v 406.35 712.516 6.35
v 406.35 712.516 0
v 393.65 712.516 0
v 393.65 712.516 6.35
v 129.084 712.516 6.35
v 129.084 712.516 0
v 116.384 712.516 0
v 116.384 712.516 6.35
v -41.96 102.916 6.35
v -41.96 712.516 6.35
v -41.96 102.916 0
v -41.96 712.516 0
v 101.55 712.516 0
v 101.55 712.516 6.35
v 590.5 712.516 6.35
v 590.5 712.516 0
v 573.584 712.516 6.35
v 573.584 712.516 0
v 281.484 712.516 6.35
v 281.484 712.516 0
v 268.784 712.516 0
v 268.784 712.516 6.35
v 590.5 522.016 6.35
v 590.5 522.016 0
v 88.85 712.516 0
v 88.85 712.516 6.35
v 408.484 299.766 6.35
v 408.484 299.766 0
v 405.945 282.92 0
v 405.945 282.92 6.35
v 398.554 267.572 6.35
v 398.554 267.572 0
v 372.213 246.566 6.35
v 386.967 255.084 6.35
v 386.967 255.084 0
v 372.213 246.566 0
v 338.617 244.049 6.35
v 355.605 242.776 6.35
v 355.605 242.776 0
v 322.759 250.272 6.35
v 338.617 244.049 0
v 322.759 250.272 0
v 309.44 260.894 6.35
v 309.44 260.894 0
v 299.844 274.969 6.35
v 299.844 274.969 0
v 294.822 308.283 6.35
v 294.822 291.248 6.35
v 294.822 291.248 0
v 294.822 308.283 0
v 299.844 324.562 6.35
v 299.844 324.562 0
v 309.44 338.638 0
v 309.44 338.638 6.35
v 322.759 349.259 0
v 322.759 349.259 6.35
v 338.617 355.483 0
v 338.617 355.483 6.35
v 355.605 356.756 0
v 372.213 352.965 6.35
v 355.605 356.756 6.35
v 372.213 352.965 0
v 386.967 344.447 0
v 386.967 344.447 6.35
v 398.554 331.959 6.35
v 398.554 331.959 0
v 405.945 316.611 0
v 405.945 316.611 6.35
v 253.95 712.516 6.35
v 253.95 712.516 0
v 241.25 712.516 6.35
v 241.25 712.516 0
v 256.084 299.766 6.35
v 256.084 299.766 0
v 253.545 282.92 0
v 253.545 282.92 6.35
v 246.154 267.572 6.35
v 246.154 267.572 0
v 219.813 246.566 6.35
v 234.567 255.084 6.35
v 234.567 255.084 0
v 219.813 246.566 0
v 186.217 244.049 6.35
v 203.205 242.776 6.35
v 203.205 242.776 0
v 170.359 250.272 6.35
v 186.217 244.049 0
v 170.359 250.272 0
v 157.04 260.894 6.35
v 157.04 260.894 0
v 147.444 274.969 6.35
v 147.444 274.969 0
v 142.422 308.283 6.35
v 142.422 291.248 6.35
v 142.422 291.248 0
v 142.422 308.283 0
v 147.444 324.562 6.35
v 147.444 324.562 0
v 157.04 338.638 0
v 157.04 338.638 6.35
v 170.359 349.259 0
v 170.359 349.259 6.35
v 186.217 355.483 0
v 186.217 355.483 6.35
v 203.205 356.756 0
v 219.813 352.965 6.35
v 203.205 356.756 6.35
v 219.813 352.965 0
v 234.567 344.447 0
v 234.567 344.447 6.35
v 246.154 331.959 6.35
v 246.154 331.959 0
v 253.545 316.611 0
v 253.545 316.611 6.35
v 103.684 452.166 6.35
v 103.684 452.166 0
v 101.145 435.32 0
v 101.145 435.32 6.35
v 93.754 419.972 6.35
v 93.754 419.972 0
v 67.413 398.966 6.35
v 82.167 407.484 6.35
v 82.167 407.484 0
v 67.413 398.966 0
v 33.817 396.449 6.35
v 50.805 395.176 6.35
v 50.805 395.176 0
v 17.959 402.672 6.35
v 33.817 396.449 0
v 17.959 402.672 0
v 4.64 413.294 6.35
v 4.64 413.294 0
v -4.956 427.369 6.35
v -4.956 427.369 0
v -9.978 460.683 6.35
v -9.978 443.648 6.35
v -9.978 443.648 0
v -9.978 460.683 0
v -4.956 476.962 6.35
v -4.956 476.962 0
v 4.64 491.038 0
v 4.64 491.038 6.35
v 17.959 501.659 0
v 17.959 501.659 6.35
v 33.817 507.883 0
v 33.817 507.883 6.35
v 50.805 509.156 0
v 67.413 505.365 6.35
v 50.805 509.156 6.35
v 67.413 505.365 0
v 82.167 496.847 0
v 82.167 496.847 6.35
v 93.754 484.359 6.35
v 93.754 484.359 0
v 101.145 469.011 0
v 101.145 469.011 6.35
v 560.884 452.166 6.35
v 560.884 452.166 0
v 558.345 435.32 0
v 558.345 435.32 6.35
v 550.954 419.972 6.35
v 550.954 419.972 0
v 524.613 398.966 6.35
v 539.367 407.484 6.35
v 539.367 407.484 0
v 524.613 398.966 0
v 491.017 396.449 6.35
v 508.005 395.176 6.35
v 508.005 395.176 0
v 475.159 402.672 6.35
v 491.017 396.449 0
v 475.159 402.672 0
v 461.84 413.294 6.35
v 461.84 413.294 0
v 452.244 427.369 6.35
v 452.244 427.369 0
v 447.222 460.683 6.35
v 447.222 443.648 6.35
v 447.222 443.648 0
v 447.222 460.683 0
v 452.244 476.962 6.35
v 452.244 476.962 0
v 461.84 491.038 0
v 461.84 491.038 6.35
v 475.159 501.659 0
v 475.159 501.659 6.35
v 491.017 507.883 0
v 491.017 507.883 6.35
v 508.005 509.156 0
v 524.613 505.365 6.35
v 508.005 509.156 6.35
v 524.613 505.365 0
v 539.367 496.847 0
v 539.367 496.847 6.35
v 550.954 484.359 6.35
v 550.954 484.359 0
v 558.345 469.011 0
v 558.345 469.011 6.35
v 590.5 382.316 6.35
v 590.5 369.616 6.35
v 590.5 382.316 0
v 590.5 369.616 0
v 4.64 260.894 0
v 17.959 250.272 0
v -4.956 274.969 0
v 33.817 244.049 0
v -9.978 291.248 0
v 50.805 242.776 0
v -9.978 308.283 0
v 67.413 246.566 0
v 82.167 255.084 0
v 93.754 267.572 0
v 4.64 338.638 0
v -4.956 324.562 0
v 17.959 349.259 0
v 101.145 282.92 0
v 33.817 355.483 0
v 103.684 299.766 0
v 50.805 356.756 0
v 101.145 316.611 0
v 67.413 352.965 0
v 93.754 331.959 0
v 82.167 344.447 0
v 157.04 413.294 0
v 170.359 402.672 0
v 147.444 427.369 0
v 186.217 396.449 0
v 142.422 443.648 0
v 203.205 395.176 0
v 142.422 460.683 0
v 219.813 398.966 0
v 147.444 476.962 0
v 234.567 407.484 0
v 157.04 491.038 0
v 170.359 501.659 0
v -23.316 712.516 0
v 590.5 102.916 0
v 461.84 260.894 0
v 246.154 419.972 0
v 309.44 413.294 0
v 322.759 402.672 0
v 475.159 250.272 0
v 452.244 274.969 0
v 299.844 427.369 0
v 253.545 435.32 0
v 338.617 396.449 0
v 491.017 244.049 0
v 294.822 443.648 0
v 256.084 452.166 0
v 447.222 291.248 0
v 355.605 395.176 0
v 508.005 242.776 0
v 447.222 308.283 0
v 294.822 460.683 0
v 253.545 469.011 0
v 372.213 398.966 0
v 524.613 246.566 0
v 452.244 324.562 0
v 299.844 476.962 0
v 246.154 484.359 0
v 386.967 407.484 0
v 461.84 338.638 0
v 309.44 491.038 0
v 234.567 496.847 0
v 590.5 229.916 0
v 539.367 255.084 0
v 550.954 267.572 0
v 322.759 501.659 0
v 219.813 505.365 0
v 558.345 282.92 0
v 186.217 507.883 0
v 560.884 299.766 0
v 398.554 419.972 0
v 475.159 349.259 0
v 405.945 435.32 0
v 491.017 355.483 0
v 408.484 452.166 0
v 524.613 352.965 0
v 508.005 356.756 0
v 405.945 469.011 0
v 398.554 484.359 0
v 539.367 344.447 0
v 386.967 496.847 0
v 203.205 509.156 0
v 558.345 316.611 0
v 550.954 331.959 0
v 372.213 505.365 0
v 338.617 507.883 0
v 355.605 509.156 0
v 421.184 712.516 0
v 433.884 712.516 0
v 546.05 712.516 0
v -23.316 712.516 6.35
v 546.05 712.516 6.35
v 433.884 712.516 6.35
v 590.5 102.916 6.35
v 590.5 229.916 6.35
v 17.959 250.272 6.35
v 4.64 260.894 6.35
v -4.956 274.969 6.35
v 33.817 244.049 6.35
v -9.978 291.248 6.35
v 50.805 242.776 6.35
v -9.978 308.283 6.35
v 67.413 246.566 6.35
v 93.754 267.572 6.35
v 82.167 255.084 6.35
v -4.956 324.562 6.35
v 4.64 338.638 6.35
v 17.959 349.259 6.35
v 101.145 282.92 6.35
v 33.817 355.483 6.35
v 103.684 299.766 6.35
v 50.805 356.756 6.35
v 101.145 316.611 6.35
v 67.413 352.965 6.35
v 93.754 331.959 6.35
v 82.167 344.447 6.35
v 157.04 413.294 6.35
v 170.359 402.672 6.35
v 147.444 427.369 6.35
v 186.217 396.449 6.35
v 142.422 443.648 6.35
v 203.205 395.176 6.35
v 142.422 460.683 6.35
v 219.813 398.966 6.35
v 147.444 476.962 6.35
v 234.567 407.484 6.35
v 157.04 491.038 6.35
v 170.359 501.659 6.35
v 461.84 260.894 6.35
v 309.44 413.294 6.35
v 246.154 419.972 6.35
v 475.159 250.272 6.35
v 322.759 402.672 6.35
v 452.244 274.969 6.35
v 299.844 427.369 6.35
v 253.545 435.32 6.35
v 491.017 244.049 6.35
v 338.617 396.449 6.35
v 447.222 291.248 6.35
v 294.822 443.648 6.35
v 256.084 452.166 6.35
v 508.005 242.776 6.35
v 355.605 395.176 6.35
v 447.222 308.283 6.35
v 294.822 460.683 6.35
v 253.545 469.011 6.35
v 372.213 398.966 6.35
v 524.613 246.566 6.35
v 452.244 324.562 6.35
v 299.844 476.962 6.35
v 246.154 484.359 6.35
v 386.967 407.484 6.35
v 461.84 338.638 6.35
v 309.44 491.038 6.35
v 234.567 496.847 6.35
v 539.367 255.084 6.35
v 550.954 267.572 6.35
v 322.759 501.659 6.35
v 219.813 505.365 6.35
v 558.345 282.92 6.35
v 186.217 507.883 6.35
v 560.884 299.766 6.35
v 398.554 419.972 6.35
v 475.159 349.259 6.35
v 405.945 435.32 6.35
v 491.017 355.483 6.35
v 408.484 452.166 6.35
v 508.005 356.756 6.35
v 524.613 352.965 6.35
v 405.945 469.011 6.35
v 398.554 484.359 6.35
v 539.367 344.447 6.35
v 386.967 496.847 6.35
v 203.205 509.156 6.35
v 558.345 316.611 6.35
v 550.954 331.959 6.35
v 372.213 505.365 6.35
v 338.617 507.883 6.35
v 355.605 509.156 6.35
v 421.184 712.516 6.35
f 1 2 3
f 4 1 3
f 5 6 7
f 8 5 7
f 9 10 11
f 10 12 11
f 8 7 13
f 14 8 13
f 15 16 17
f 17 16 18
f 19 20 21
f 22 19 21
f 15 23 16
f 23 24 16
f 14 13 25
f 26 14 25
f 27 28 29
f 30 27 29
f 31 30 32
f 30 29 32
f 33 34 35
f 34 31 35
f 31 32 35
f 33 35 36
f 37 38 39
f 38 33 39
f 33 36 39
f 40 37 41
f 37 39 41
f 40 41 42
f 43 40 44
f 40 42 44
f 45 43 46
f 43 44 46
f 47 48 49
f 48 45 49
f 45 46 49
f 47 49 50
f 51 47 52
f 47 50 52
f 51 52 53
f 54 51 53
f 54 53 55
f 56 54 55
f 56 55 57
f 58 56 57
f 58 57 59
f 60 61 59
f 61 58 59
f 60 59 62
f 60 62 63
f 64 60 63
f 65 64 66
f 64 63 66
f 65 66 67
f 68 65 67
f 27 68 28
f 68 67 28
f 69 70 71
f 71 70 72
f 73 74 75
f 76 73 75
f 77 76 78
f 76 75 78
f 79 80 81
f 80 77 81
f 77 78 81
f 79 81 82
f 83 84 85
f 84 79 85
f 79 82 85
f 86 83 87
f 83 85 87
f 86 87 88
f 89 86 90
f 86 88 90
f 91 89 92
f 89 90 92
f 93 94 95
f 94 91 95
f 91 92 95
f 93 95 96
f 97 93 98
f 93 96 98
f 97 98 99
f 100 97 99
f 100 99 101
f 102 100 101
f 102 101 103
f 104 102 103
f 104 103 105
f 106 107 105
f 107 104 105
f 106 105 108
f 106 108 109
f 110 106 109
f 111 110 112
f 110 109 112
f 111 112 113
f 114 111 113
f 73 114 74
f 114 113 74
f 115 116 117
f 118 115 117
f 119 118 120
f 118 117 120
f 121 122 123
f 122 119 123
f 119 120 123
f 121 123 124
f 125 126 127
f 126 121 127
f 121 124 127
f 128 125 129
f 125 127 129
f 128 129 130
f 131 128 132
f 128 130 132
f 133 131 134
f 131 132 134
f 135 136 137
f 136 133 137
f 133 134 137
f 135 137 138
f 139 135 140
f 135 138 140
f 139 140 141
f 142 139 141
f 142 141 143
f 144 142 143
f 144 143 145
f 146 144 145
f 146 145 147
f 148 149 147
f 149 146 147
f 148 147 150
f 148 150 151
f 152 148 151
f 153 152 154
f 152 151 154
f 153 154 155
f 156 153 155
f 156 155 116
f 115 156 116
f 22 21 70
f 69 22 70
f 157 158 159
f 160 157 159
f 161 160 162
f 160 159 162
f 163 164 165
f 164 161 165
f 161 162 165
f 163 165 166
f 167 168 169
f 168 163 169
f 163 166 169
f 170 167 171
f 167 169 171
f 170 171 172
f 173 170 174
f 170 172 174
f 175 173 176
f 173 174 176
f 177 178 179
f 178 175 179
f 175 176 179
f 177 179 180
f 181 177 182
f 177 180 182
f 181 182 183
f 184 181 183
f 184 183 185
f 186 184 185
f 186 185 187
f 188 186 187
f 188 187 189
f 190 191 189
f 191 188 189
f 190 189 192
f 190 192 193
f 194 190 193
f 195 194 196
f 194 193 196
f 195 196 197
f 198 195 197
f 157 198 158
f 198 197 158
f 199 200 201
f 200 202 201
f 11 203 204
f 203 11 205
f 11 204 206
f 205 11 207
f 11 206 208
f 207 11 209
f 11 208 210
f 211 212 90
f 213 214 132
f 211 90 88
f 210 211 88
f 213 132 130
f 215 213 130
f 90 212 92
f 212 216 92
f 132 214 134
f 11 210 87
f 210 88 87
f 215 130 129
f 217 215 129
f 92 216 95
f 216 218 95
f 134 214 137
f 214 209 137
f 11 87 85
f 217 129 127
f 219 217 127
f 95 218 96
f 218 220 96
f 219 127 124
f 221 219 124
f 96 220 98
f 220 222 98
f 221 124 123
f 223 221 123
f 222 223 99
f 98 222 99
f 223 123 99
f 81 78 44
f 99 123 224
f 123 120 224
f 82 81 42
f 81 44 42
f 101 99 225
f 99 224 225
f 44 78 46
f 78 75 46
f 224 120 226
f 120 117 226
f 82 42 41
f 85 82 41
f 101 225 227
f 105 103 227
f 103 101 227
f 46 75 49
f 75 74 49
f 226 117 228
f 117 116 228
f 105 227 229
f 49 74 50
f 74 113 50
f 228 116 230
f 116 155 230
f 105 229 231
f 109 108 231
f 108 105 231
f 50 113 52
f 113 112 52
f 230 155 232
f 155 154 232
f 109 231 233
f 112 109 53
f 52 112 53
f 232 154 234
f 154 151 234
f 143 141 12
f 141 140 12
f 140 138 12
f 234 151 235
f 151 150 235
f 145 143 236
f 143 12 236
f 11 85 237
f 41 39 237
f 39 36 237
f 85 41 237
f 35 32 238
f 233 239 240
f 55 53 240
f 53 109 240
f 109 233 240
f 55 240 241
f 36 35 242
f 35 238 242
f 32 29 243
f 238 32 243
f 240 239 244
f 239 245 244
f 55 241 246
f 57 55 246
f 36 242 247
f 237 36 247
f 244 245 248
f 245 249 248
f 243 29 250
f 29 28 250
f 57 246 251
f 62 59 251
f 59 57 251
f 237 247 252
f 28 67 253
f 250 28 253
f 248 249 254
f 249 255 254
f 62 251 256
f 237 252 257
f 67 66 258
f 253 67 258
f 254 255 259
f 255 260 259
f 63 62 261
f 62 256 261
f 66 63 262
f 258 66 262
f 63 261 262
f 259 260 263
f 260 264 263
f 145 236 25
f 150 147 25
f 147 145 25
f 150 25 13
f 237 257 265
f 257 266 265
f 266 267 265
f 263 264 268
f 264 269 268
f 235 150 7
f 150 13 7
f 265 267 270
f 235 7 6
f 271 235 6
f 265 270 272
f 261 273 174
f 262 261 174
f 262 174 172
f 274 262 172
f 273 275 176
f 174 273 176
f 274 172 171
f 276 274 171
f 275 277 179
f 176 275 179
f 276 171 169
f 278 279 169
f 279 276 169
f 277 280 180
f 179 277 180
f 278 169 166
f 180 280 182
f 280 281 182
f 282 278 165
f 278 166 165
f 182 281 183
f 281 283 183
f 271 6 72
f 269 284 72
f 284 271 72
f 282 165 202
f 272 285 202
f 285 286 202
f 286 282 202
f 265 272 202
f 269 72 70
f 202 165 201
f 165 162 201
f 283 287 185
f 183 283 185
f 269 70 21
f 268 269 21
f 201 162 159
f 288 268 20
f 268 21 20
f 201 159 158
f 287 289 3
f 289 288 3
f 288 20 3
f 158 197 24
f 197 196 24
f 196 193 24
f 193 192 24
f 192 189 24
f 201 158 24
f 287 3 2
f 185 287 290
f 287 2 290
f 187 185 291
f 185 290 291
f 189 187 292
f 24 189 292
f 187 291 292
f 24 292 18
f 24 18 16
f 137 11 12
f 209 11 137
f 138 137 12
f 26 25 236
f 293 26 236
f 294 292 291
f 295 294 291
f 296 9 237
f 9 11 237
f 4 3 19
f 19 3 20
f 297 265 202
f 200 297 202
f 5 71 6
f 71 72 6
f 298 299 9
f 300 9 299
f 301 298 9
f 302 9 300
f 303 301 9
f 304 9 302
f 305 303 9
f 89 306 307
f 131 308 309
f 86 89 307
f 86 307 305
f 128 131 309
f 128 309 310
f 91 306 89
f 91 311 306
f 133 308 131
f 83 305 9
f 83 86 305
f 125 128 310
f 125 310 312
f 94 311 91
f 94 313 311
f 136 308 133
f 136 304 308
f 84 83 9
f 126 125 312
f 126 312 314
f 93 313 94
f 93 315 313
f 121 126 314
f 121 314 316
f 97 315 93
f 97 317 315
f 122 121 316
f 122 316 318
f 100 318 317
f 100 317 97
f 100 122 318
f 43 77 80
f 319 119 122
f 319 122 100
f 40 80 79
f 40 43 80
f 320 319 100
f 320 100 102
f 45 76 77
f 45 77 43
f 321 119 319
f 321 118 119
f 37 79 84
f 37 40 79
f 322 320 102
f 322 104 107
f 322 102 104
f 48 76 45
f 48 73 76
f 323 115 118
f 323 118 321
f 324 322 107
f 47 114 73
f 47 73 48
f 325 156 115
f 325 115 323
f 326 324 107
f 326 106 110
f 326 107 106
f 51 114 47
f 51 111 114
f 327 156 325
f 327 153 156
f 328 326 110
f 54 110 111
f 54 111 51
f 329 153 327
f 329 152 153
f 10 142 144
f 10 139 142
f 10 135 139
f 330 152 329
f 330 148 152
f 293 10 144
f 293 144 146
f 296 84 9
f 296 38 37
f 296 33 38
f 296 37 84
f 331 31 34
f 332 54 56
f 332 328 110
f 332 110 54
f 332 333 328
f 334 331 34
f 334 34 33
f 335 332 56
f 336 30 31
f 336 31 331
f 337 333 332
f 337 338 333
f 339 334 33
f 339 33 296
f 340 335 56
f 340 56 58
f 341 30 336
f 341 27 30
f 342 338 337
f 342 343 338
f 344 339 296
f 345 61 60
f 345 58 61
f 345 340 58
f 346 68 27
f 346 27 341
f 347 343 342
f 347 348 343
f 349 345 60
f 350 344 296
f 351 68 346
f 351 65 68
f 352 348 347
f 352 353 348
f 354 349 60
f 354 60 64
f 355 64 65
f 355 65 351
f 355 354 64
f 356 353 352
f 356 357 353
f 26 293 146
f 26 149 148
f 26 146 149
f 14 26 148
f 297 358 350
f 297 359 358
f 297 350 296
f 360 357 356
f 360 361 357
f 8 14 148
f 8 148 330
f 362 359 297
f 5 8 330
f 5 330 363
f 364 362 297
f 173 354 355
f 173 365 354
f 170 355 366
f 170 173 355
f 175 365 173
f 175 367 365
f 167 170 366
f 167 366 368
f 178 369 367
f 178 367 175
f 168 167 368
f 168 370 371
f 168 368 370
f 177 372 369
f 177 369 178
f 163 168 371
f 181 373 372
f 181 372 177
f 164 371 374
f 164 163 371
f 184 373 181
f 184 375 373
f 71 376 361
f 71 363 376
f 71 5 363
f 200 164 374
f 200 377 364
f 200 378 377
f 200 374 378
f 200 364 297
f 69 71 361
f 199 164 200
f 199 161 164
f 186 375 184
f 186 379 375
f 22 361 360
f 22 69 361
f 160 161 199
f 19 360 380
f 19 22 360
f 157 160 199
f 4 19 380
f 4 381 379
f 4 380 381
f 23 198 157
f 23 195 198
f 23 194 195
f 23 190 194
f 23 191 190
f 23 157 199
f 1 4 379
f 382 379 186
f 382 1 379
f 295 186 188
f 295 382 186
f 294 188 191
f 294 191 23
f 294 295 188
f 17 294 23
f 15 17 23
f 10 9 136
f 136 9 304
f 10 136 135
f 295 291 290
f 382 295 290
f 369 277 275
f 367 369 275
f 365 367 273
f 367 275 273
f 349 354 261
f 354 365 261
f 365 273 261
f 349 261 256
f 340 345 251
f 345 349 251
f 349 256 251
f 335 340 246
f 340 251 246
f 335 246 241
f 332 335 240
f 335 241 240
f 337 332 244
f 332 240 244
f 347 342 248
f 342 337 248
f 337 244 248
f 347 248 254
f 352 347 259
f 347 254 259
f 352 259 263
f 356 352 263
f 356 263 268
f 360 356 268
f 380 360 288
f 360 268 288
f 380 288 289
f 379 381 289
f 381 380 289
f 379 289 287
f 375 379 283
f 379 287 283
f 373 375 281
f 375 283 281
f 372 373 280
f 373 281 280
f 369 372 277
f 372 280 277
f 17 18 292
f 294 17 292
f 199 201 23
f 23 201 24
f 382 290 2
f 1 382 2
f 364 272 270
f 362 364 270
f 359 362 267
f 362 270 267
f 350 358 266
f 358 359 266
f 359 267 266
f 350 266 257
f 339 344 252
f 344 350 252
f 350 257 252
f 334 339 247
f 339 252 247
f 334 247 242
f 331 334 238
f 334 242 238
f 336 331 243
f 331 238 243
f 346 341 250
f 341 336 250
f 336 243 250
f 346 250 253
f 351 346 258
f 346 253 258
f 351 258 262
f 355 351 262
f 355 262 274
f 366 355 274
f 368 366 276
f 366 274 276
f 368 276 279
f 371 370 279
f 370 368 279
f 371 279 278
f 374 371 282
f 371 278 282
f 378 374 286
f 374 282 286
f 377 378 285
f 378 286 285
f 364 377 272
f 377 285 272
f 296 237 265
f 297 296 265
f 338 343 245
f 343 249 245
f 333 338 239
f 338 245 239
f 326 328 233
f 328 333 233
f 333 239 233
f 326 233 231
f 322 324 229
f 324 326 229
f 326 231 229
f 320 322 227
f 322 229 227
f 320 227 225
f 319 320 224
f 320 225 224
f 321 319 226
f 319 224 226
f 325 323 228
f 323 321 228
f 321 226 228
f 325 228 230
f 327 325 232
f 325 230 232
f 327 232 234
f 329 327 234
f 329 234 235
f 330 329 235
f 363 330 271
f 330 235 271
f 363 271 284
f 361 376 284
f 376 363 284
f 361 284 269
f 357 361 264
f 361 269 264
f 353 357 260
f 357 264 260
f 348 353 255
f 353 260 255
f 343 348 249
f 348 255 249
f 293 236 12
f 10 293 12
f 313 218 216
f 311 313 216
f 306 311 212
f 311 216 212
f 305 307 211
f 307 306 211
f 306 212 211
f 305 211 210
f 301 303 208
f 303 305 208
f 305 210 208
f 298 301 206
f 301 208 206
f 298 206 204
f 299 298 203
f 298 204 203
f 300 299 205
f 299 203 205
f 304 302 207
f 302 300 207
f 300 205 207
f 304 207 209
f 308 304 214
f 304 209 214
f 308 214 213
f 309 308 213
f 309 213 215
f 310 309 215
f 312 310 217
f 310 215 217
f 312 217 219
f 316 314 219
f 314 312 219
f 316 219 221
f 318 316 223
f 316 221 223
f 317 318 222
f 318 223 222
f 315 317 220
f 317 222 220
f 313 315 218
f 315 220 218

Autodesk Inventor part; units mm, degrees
ref_plane "YZ Plane" through (0, 0, 0) normal (1, 0, 0) x (0, 1, 0)
ref_plane "XZ Plane" through (0, 0, 0) normal (0, 1, 0) x (-1, 0, 0)
ref_plane "XY Plane" through (0, 0, 0) normal (0, 0, 1) x (1, 0, 0)
sketch "Sketch1" plane through (0, 0, 0) normal (0, 0, 1) x (1, 0, 0)
  line L0 (-41.9595, 102.9157) -> (590.5005, 102.9157)
  line L1 (590.5005, 102.9157) -> (590.5005, 712.5157)
  line L2 (590.5005, 712.5157) -> (-41.9595, 712.5157)
  line L3 (-41.9595, 712.5157) -> (-41.9595, 102.9157)
  line L4 (-41.9595, 712.5157) -> (-23.3159, 712.5157)
  line L5 (590.5005, 712.5157) -> (546.0505, 712.5157)
  line L6 (546.0505, 712.5157) -> (406.3505, 712.5157)
  line L7 (406.3505, 712.5157) -> (393.6505, 712.5157)
  line L8 (393.6505, 712.5157) -> (253.9505, 712.5157)
  line L9 (253.9505, 712.5157) -> (241.2505, 712.5157)
  line L10 (241.2505, 712.5157) -> (101.5505, 712.5157)
  line L11 (101.5505, 712.5157) -> (88.8505, 712.5157)
  line L12 (88.8505, 712.5157) -> (-23.3159, 712.5157)
  line L13 (590.5005, 102.9157) -> (590.5005, 229.9157)
  line L14 (590.5005, 229.9157) -> (590.5005, 369.6157)
  line L15 (590.5005, 369.6157) -> (590.5005, 382.3157)
  line L16 (590.5005, 382.3157) -> (590.5005, 522.0157)
  circle A0 centre (46.5341, 452.1657) radius 57.15
  circle A1 centre (198.9341, 452.1657) radius 57.15
  circle A2 centre (351.3341, 452.1657) radius 57.15
  circle A3 centre (503.7341, 452.1657) radius 57.15
  circle A4 centre (46.5341, 299.7657) radius 57.15
  circle A5 centre (198.9341, 299.7657) radius 57.15
  circle A6 centre (351.3341, 299.7657) radius 57.15
  circle A7 centre (503.7341, 299.7657) radius 57.15
  line L17 (-23.3159, 712.5157) -> (116.3841, 712.5157)
  line L18 (116.3841, 712.5157) -> (129.0841, 712.5157)
  line L19 (129.0841, 712.5157) -> (268.7841, 712.5157)
  line L20 (268.7841, 712.5157) -> (281.4841, 712.5157)
  line L21 (281.4841, 712.5157) -> (421.1841, 712.5157)
  line L22 (421.1841, 712.5157) -> (433.8841, 712.5157)
  line L23 (433.8841, 712.5157) -> (573.5841, 712.5157)
  dimension "d0" = 632.46
  dimension "d1" = 609.6
  dimension "d2" = 18.6436
  dimension "d24" = 127
  dimension "d25" = 139.7
  dimension "d26" = 12.7
  dimension "d27" = 139.7
  dimension "d28" = 114.3
  dimension "d29" = 114.3
  dimension "d30" = 114.3
  dimension "d31" = 114.3
  dimension "d32" = 114.3
  dimension "d33" = 114.3
  dimension "d34" = 114.3
  dimension "d35" = 114.3
  dimension "d38" = 139.7
  dimension "d39" = 12.7
  dimension "d40" = 139.7
  dimension "d41" = 12.7
  dimension "d42" = 139.7
  dimension "d43" = 12.7
  dimension "d44" = 139.7
extrude "Extrusion2" add sketch "Sketch1" along normal blind 6.35
equation "\"BendRadius\" = Thickness"
equation "\"BendReliefWidth\" = Thickness"
equation "\"BendReliefDepth\" = 0.5 * Thickness"
equation "\"CornerReliefSize\" = 4 * Thickness"
equation "\"MinimumRemnant\" = 2 * Thickness"
equation "\"TransitionRadius\" = BendRadius"
equation "\"JacobiRadiusSize\" = BendRadius"
equation "\"GapSize\" = Thickness"
equation "\"Thickness\" = 3.048"
properties part number "vessel support top"
